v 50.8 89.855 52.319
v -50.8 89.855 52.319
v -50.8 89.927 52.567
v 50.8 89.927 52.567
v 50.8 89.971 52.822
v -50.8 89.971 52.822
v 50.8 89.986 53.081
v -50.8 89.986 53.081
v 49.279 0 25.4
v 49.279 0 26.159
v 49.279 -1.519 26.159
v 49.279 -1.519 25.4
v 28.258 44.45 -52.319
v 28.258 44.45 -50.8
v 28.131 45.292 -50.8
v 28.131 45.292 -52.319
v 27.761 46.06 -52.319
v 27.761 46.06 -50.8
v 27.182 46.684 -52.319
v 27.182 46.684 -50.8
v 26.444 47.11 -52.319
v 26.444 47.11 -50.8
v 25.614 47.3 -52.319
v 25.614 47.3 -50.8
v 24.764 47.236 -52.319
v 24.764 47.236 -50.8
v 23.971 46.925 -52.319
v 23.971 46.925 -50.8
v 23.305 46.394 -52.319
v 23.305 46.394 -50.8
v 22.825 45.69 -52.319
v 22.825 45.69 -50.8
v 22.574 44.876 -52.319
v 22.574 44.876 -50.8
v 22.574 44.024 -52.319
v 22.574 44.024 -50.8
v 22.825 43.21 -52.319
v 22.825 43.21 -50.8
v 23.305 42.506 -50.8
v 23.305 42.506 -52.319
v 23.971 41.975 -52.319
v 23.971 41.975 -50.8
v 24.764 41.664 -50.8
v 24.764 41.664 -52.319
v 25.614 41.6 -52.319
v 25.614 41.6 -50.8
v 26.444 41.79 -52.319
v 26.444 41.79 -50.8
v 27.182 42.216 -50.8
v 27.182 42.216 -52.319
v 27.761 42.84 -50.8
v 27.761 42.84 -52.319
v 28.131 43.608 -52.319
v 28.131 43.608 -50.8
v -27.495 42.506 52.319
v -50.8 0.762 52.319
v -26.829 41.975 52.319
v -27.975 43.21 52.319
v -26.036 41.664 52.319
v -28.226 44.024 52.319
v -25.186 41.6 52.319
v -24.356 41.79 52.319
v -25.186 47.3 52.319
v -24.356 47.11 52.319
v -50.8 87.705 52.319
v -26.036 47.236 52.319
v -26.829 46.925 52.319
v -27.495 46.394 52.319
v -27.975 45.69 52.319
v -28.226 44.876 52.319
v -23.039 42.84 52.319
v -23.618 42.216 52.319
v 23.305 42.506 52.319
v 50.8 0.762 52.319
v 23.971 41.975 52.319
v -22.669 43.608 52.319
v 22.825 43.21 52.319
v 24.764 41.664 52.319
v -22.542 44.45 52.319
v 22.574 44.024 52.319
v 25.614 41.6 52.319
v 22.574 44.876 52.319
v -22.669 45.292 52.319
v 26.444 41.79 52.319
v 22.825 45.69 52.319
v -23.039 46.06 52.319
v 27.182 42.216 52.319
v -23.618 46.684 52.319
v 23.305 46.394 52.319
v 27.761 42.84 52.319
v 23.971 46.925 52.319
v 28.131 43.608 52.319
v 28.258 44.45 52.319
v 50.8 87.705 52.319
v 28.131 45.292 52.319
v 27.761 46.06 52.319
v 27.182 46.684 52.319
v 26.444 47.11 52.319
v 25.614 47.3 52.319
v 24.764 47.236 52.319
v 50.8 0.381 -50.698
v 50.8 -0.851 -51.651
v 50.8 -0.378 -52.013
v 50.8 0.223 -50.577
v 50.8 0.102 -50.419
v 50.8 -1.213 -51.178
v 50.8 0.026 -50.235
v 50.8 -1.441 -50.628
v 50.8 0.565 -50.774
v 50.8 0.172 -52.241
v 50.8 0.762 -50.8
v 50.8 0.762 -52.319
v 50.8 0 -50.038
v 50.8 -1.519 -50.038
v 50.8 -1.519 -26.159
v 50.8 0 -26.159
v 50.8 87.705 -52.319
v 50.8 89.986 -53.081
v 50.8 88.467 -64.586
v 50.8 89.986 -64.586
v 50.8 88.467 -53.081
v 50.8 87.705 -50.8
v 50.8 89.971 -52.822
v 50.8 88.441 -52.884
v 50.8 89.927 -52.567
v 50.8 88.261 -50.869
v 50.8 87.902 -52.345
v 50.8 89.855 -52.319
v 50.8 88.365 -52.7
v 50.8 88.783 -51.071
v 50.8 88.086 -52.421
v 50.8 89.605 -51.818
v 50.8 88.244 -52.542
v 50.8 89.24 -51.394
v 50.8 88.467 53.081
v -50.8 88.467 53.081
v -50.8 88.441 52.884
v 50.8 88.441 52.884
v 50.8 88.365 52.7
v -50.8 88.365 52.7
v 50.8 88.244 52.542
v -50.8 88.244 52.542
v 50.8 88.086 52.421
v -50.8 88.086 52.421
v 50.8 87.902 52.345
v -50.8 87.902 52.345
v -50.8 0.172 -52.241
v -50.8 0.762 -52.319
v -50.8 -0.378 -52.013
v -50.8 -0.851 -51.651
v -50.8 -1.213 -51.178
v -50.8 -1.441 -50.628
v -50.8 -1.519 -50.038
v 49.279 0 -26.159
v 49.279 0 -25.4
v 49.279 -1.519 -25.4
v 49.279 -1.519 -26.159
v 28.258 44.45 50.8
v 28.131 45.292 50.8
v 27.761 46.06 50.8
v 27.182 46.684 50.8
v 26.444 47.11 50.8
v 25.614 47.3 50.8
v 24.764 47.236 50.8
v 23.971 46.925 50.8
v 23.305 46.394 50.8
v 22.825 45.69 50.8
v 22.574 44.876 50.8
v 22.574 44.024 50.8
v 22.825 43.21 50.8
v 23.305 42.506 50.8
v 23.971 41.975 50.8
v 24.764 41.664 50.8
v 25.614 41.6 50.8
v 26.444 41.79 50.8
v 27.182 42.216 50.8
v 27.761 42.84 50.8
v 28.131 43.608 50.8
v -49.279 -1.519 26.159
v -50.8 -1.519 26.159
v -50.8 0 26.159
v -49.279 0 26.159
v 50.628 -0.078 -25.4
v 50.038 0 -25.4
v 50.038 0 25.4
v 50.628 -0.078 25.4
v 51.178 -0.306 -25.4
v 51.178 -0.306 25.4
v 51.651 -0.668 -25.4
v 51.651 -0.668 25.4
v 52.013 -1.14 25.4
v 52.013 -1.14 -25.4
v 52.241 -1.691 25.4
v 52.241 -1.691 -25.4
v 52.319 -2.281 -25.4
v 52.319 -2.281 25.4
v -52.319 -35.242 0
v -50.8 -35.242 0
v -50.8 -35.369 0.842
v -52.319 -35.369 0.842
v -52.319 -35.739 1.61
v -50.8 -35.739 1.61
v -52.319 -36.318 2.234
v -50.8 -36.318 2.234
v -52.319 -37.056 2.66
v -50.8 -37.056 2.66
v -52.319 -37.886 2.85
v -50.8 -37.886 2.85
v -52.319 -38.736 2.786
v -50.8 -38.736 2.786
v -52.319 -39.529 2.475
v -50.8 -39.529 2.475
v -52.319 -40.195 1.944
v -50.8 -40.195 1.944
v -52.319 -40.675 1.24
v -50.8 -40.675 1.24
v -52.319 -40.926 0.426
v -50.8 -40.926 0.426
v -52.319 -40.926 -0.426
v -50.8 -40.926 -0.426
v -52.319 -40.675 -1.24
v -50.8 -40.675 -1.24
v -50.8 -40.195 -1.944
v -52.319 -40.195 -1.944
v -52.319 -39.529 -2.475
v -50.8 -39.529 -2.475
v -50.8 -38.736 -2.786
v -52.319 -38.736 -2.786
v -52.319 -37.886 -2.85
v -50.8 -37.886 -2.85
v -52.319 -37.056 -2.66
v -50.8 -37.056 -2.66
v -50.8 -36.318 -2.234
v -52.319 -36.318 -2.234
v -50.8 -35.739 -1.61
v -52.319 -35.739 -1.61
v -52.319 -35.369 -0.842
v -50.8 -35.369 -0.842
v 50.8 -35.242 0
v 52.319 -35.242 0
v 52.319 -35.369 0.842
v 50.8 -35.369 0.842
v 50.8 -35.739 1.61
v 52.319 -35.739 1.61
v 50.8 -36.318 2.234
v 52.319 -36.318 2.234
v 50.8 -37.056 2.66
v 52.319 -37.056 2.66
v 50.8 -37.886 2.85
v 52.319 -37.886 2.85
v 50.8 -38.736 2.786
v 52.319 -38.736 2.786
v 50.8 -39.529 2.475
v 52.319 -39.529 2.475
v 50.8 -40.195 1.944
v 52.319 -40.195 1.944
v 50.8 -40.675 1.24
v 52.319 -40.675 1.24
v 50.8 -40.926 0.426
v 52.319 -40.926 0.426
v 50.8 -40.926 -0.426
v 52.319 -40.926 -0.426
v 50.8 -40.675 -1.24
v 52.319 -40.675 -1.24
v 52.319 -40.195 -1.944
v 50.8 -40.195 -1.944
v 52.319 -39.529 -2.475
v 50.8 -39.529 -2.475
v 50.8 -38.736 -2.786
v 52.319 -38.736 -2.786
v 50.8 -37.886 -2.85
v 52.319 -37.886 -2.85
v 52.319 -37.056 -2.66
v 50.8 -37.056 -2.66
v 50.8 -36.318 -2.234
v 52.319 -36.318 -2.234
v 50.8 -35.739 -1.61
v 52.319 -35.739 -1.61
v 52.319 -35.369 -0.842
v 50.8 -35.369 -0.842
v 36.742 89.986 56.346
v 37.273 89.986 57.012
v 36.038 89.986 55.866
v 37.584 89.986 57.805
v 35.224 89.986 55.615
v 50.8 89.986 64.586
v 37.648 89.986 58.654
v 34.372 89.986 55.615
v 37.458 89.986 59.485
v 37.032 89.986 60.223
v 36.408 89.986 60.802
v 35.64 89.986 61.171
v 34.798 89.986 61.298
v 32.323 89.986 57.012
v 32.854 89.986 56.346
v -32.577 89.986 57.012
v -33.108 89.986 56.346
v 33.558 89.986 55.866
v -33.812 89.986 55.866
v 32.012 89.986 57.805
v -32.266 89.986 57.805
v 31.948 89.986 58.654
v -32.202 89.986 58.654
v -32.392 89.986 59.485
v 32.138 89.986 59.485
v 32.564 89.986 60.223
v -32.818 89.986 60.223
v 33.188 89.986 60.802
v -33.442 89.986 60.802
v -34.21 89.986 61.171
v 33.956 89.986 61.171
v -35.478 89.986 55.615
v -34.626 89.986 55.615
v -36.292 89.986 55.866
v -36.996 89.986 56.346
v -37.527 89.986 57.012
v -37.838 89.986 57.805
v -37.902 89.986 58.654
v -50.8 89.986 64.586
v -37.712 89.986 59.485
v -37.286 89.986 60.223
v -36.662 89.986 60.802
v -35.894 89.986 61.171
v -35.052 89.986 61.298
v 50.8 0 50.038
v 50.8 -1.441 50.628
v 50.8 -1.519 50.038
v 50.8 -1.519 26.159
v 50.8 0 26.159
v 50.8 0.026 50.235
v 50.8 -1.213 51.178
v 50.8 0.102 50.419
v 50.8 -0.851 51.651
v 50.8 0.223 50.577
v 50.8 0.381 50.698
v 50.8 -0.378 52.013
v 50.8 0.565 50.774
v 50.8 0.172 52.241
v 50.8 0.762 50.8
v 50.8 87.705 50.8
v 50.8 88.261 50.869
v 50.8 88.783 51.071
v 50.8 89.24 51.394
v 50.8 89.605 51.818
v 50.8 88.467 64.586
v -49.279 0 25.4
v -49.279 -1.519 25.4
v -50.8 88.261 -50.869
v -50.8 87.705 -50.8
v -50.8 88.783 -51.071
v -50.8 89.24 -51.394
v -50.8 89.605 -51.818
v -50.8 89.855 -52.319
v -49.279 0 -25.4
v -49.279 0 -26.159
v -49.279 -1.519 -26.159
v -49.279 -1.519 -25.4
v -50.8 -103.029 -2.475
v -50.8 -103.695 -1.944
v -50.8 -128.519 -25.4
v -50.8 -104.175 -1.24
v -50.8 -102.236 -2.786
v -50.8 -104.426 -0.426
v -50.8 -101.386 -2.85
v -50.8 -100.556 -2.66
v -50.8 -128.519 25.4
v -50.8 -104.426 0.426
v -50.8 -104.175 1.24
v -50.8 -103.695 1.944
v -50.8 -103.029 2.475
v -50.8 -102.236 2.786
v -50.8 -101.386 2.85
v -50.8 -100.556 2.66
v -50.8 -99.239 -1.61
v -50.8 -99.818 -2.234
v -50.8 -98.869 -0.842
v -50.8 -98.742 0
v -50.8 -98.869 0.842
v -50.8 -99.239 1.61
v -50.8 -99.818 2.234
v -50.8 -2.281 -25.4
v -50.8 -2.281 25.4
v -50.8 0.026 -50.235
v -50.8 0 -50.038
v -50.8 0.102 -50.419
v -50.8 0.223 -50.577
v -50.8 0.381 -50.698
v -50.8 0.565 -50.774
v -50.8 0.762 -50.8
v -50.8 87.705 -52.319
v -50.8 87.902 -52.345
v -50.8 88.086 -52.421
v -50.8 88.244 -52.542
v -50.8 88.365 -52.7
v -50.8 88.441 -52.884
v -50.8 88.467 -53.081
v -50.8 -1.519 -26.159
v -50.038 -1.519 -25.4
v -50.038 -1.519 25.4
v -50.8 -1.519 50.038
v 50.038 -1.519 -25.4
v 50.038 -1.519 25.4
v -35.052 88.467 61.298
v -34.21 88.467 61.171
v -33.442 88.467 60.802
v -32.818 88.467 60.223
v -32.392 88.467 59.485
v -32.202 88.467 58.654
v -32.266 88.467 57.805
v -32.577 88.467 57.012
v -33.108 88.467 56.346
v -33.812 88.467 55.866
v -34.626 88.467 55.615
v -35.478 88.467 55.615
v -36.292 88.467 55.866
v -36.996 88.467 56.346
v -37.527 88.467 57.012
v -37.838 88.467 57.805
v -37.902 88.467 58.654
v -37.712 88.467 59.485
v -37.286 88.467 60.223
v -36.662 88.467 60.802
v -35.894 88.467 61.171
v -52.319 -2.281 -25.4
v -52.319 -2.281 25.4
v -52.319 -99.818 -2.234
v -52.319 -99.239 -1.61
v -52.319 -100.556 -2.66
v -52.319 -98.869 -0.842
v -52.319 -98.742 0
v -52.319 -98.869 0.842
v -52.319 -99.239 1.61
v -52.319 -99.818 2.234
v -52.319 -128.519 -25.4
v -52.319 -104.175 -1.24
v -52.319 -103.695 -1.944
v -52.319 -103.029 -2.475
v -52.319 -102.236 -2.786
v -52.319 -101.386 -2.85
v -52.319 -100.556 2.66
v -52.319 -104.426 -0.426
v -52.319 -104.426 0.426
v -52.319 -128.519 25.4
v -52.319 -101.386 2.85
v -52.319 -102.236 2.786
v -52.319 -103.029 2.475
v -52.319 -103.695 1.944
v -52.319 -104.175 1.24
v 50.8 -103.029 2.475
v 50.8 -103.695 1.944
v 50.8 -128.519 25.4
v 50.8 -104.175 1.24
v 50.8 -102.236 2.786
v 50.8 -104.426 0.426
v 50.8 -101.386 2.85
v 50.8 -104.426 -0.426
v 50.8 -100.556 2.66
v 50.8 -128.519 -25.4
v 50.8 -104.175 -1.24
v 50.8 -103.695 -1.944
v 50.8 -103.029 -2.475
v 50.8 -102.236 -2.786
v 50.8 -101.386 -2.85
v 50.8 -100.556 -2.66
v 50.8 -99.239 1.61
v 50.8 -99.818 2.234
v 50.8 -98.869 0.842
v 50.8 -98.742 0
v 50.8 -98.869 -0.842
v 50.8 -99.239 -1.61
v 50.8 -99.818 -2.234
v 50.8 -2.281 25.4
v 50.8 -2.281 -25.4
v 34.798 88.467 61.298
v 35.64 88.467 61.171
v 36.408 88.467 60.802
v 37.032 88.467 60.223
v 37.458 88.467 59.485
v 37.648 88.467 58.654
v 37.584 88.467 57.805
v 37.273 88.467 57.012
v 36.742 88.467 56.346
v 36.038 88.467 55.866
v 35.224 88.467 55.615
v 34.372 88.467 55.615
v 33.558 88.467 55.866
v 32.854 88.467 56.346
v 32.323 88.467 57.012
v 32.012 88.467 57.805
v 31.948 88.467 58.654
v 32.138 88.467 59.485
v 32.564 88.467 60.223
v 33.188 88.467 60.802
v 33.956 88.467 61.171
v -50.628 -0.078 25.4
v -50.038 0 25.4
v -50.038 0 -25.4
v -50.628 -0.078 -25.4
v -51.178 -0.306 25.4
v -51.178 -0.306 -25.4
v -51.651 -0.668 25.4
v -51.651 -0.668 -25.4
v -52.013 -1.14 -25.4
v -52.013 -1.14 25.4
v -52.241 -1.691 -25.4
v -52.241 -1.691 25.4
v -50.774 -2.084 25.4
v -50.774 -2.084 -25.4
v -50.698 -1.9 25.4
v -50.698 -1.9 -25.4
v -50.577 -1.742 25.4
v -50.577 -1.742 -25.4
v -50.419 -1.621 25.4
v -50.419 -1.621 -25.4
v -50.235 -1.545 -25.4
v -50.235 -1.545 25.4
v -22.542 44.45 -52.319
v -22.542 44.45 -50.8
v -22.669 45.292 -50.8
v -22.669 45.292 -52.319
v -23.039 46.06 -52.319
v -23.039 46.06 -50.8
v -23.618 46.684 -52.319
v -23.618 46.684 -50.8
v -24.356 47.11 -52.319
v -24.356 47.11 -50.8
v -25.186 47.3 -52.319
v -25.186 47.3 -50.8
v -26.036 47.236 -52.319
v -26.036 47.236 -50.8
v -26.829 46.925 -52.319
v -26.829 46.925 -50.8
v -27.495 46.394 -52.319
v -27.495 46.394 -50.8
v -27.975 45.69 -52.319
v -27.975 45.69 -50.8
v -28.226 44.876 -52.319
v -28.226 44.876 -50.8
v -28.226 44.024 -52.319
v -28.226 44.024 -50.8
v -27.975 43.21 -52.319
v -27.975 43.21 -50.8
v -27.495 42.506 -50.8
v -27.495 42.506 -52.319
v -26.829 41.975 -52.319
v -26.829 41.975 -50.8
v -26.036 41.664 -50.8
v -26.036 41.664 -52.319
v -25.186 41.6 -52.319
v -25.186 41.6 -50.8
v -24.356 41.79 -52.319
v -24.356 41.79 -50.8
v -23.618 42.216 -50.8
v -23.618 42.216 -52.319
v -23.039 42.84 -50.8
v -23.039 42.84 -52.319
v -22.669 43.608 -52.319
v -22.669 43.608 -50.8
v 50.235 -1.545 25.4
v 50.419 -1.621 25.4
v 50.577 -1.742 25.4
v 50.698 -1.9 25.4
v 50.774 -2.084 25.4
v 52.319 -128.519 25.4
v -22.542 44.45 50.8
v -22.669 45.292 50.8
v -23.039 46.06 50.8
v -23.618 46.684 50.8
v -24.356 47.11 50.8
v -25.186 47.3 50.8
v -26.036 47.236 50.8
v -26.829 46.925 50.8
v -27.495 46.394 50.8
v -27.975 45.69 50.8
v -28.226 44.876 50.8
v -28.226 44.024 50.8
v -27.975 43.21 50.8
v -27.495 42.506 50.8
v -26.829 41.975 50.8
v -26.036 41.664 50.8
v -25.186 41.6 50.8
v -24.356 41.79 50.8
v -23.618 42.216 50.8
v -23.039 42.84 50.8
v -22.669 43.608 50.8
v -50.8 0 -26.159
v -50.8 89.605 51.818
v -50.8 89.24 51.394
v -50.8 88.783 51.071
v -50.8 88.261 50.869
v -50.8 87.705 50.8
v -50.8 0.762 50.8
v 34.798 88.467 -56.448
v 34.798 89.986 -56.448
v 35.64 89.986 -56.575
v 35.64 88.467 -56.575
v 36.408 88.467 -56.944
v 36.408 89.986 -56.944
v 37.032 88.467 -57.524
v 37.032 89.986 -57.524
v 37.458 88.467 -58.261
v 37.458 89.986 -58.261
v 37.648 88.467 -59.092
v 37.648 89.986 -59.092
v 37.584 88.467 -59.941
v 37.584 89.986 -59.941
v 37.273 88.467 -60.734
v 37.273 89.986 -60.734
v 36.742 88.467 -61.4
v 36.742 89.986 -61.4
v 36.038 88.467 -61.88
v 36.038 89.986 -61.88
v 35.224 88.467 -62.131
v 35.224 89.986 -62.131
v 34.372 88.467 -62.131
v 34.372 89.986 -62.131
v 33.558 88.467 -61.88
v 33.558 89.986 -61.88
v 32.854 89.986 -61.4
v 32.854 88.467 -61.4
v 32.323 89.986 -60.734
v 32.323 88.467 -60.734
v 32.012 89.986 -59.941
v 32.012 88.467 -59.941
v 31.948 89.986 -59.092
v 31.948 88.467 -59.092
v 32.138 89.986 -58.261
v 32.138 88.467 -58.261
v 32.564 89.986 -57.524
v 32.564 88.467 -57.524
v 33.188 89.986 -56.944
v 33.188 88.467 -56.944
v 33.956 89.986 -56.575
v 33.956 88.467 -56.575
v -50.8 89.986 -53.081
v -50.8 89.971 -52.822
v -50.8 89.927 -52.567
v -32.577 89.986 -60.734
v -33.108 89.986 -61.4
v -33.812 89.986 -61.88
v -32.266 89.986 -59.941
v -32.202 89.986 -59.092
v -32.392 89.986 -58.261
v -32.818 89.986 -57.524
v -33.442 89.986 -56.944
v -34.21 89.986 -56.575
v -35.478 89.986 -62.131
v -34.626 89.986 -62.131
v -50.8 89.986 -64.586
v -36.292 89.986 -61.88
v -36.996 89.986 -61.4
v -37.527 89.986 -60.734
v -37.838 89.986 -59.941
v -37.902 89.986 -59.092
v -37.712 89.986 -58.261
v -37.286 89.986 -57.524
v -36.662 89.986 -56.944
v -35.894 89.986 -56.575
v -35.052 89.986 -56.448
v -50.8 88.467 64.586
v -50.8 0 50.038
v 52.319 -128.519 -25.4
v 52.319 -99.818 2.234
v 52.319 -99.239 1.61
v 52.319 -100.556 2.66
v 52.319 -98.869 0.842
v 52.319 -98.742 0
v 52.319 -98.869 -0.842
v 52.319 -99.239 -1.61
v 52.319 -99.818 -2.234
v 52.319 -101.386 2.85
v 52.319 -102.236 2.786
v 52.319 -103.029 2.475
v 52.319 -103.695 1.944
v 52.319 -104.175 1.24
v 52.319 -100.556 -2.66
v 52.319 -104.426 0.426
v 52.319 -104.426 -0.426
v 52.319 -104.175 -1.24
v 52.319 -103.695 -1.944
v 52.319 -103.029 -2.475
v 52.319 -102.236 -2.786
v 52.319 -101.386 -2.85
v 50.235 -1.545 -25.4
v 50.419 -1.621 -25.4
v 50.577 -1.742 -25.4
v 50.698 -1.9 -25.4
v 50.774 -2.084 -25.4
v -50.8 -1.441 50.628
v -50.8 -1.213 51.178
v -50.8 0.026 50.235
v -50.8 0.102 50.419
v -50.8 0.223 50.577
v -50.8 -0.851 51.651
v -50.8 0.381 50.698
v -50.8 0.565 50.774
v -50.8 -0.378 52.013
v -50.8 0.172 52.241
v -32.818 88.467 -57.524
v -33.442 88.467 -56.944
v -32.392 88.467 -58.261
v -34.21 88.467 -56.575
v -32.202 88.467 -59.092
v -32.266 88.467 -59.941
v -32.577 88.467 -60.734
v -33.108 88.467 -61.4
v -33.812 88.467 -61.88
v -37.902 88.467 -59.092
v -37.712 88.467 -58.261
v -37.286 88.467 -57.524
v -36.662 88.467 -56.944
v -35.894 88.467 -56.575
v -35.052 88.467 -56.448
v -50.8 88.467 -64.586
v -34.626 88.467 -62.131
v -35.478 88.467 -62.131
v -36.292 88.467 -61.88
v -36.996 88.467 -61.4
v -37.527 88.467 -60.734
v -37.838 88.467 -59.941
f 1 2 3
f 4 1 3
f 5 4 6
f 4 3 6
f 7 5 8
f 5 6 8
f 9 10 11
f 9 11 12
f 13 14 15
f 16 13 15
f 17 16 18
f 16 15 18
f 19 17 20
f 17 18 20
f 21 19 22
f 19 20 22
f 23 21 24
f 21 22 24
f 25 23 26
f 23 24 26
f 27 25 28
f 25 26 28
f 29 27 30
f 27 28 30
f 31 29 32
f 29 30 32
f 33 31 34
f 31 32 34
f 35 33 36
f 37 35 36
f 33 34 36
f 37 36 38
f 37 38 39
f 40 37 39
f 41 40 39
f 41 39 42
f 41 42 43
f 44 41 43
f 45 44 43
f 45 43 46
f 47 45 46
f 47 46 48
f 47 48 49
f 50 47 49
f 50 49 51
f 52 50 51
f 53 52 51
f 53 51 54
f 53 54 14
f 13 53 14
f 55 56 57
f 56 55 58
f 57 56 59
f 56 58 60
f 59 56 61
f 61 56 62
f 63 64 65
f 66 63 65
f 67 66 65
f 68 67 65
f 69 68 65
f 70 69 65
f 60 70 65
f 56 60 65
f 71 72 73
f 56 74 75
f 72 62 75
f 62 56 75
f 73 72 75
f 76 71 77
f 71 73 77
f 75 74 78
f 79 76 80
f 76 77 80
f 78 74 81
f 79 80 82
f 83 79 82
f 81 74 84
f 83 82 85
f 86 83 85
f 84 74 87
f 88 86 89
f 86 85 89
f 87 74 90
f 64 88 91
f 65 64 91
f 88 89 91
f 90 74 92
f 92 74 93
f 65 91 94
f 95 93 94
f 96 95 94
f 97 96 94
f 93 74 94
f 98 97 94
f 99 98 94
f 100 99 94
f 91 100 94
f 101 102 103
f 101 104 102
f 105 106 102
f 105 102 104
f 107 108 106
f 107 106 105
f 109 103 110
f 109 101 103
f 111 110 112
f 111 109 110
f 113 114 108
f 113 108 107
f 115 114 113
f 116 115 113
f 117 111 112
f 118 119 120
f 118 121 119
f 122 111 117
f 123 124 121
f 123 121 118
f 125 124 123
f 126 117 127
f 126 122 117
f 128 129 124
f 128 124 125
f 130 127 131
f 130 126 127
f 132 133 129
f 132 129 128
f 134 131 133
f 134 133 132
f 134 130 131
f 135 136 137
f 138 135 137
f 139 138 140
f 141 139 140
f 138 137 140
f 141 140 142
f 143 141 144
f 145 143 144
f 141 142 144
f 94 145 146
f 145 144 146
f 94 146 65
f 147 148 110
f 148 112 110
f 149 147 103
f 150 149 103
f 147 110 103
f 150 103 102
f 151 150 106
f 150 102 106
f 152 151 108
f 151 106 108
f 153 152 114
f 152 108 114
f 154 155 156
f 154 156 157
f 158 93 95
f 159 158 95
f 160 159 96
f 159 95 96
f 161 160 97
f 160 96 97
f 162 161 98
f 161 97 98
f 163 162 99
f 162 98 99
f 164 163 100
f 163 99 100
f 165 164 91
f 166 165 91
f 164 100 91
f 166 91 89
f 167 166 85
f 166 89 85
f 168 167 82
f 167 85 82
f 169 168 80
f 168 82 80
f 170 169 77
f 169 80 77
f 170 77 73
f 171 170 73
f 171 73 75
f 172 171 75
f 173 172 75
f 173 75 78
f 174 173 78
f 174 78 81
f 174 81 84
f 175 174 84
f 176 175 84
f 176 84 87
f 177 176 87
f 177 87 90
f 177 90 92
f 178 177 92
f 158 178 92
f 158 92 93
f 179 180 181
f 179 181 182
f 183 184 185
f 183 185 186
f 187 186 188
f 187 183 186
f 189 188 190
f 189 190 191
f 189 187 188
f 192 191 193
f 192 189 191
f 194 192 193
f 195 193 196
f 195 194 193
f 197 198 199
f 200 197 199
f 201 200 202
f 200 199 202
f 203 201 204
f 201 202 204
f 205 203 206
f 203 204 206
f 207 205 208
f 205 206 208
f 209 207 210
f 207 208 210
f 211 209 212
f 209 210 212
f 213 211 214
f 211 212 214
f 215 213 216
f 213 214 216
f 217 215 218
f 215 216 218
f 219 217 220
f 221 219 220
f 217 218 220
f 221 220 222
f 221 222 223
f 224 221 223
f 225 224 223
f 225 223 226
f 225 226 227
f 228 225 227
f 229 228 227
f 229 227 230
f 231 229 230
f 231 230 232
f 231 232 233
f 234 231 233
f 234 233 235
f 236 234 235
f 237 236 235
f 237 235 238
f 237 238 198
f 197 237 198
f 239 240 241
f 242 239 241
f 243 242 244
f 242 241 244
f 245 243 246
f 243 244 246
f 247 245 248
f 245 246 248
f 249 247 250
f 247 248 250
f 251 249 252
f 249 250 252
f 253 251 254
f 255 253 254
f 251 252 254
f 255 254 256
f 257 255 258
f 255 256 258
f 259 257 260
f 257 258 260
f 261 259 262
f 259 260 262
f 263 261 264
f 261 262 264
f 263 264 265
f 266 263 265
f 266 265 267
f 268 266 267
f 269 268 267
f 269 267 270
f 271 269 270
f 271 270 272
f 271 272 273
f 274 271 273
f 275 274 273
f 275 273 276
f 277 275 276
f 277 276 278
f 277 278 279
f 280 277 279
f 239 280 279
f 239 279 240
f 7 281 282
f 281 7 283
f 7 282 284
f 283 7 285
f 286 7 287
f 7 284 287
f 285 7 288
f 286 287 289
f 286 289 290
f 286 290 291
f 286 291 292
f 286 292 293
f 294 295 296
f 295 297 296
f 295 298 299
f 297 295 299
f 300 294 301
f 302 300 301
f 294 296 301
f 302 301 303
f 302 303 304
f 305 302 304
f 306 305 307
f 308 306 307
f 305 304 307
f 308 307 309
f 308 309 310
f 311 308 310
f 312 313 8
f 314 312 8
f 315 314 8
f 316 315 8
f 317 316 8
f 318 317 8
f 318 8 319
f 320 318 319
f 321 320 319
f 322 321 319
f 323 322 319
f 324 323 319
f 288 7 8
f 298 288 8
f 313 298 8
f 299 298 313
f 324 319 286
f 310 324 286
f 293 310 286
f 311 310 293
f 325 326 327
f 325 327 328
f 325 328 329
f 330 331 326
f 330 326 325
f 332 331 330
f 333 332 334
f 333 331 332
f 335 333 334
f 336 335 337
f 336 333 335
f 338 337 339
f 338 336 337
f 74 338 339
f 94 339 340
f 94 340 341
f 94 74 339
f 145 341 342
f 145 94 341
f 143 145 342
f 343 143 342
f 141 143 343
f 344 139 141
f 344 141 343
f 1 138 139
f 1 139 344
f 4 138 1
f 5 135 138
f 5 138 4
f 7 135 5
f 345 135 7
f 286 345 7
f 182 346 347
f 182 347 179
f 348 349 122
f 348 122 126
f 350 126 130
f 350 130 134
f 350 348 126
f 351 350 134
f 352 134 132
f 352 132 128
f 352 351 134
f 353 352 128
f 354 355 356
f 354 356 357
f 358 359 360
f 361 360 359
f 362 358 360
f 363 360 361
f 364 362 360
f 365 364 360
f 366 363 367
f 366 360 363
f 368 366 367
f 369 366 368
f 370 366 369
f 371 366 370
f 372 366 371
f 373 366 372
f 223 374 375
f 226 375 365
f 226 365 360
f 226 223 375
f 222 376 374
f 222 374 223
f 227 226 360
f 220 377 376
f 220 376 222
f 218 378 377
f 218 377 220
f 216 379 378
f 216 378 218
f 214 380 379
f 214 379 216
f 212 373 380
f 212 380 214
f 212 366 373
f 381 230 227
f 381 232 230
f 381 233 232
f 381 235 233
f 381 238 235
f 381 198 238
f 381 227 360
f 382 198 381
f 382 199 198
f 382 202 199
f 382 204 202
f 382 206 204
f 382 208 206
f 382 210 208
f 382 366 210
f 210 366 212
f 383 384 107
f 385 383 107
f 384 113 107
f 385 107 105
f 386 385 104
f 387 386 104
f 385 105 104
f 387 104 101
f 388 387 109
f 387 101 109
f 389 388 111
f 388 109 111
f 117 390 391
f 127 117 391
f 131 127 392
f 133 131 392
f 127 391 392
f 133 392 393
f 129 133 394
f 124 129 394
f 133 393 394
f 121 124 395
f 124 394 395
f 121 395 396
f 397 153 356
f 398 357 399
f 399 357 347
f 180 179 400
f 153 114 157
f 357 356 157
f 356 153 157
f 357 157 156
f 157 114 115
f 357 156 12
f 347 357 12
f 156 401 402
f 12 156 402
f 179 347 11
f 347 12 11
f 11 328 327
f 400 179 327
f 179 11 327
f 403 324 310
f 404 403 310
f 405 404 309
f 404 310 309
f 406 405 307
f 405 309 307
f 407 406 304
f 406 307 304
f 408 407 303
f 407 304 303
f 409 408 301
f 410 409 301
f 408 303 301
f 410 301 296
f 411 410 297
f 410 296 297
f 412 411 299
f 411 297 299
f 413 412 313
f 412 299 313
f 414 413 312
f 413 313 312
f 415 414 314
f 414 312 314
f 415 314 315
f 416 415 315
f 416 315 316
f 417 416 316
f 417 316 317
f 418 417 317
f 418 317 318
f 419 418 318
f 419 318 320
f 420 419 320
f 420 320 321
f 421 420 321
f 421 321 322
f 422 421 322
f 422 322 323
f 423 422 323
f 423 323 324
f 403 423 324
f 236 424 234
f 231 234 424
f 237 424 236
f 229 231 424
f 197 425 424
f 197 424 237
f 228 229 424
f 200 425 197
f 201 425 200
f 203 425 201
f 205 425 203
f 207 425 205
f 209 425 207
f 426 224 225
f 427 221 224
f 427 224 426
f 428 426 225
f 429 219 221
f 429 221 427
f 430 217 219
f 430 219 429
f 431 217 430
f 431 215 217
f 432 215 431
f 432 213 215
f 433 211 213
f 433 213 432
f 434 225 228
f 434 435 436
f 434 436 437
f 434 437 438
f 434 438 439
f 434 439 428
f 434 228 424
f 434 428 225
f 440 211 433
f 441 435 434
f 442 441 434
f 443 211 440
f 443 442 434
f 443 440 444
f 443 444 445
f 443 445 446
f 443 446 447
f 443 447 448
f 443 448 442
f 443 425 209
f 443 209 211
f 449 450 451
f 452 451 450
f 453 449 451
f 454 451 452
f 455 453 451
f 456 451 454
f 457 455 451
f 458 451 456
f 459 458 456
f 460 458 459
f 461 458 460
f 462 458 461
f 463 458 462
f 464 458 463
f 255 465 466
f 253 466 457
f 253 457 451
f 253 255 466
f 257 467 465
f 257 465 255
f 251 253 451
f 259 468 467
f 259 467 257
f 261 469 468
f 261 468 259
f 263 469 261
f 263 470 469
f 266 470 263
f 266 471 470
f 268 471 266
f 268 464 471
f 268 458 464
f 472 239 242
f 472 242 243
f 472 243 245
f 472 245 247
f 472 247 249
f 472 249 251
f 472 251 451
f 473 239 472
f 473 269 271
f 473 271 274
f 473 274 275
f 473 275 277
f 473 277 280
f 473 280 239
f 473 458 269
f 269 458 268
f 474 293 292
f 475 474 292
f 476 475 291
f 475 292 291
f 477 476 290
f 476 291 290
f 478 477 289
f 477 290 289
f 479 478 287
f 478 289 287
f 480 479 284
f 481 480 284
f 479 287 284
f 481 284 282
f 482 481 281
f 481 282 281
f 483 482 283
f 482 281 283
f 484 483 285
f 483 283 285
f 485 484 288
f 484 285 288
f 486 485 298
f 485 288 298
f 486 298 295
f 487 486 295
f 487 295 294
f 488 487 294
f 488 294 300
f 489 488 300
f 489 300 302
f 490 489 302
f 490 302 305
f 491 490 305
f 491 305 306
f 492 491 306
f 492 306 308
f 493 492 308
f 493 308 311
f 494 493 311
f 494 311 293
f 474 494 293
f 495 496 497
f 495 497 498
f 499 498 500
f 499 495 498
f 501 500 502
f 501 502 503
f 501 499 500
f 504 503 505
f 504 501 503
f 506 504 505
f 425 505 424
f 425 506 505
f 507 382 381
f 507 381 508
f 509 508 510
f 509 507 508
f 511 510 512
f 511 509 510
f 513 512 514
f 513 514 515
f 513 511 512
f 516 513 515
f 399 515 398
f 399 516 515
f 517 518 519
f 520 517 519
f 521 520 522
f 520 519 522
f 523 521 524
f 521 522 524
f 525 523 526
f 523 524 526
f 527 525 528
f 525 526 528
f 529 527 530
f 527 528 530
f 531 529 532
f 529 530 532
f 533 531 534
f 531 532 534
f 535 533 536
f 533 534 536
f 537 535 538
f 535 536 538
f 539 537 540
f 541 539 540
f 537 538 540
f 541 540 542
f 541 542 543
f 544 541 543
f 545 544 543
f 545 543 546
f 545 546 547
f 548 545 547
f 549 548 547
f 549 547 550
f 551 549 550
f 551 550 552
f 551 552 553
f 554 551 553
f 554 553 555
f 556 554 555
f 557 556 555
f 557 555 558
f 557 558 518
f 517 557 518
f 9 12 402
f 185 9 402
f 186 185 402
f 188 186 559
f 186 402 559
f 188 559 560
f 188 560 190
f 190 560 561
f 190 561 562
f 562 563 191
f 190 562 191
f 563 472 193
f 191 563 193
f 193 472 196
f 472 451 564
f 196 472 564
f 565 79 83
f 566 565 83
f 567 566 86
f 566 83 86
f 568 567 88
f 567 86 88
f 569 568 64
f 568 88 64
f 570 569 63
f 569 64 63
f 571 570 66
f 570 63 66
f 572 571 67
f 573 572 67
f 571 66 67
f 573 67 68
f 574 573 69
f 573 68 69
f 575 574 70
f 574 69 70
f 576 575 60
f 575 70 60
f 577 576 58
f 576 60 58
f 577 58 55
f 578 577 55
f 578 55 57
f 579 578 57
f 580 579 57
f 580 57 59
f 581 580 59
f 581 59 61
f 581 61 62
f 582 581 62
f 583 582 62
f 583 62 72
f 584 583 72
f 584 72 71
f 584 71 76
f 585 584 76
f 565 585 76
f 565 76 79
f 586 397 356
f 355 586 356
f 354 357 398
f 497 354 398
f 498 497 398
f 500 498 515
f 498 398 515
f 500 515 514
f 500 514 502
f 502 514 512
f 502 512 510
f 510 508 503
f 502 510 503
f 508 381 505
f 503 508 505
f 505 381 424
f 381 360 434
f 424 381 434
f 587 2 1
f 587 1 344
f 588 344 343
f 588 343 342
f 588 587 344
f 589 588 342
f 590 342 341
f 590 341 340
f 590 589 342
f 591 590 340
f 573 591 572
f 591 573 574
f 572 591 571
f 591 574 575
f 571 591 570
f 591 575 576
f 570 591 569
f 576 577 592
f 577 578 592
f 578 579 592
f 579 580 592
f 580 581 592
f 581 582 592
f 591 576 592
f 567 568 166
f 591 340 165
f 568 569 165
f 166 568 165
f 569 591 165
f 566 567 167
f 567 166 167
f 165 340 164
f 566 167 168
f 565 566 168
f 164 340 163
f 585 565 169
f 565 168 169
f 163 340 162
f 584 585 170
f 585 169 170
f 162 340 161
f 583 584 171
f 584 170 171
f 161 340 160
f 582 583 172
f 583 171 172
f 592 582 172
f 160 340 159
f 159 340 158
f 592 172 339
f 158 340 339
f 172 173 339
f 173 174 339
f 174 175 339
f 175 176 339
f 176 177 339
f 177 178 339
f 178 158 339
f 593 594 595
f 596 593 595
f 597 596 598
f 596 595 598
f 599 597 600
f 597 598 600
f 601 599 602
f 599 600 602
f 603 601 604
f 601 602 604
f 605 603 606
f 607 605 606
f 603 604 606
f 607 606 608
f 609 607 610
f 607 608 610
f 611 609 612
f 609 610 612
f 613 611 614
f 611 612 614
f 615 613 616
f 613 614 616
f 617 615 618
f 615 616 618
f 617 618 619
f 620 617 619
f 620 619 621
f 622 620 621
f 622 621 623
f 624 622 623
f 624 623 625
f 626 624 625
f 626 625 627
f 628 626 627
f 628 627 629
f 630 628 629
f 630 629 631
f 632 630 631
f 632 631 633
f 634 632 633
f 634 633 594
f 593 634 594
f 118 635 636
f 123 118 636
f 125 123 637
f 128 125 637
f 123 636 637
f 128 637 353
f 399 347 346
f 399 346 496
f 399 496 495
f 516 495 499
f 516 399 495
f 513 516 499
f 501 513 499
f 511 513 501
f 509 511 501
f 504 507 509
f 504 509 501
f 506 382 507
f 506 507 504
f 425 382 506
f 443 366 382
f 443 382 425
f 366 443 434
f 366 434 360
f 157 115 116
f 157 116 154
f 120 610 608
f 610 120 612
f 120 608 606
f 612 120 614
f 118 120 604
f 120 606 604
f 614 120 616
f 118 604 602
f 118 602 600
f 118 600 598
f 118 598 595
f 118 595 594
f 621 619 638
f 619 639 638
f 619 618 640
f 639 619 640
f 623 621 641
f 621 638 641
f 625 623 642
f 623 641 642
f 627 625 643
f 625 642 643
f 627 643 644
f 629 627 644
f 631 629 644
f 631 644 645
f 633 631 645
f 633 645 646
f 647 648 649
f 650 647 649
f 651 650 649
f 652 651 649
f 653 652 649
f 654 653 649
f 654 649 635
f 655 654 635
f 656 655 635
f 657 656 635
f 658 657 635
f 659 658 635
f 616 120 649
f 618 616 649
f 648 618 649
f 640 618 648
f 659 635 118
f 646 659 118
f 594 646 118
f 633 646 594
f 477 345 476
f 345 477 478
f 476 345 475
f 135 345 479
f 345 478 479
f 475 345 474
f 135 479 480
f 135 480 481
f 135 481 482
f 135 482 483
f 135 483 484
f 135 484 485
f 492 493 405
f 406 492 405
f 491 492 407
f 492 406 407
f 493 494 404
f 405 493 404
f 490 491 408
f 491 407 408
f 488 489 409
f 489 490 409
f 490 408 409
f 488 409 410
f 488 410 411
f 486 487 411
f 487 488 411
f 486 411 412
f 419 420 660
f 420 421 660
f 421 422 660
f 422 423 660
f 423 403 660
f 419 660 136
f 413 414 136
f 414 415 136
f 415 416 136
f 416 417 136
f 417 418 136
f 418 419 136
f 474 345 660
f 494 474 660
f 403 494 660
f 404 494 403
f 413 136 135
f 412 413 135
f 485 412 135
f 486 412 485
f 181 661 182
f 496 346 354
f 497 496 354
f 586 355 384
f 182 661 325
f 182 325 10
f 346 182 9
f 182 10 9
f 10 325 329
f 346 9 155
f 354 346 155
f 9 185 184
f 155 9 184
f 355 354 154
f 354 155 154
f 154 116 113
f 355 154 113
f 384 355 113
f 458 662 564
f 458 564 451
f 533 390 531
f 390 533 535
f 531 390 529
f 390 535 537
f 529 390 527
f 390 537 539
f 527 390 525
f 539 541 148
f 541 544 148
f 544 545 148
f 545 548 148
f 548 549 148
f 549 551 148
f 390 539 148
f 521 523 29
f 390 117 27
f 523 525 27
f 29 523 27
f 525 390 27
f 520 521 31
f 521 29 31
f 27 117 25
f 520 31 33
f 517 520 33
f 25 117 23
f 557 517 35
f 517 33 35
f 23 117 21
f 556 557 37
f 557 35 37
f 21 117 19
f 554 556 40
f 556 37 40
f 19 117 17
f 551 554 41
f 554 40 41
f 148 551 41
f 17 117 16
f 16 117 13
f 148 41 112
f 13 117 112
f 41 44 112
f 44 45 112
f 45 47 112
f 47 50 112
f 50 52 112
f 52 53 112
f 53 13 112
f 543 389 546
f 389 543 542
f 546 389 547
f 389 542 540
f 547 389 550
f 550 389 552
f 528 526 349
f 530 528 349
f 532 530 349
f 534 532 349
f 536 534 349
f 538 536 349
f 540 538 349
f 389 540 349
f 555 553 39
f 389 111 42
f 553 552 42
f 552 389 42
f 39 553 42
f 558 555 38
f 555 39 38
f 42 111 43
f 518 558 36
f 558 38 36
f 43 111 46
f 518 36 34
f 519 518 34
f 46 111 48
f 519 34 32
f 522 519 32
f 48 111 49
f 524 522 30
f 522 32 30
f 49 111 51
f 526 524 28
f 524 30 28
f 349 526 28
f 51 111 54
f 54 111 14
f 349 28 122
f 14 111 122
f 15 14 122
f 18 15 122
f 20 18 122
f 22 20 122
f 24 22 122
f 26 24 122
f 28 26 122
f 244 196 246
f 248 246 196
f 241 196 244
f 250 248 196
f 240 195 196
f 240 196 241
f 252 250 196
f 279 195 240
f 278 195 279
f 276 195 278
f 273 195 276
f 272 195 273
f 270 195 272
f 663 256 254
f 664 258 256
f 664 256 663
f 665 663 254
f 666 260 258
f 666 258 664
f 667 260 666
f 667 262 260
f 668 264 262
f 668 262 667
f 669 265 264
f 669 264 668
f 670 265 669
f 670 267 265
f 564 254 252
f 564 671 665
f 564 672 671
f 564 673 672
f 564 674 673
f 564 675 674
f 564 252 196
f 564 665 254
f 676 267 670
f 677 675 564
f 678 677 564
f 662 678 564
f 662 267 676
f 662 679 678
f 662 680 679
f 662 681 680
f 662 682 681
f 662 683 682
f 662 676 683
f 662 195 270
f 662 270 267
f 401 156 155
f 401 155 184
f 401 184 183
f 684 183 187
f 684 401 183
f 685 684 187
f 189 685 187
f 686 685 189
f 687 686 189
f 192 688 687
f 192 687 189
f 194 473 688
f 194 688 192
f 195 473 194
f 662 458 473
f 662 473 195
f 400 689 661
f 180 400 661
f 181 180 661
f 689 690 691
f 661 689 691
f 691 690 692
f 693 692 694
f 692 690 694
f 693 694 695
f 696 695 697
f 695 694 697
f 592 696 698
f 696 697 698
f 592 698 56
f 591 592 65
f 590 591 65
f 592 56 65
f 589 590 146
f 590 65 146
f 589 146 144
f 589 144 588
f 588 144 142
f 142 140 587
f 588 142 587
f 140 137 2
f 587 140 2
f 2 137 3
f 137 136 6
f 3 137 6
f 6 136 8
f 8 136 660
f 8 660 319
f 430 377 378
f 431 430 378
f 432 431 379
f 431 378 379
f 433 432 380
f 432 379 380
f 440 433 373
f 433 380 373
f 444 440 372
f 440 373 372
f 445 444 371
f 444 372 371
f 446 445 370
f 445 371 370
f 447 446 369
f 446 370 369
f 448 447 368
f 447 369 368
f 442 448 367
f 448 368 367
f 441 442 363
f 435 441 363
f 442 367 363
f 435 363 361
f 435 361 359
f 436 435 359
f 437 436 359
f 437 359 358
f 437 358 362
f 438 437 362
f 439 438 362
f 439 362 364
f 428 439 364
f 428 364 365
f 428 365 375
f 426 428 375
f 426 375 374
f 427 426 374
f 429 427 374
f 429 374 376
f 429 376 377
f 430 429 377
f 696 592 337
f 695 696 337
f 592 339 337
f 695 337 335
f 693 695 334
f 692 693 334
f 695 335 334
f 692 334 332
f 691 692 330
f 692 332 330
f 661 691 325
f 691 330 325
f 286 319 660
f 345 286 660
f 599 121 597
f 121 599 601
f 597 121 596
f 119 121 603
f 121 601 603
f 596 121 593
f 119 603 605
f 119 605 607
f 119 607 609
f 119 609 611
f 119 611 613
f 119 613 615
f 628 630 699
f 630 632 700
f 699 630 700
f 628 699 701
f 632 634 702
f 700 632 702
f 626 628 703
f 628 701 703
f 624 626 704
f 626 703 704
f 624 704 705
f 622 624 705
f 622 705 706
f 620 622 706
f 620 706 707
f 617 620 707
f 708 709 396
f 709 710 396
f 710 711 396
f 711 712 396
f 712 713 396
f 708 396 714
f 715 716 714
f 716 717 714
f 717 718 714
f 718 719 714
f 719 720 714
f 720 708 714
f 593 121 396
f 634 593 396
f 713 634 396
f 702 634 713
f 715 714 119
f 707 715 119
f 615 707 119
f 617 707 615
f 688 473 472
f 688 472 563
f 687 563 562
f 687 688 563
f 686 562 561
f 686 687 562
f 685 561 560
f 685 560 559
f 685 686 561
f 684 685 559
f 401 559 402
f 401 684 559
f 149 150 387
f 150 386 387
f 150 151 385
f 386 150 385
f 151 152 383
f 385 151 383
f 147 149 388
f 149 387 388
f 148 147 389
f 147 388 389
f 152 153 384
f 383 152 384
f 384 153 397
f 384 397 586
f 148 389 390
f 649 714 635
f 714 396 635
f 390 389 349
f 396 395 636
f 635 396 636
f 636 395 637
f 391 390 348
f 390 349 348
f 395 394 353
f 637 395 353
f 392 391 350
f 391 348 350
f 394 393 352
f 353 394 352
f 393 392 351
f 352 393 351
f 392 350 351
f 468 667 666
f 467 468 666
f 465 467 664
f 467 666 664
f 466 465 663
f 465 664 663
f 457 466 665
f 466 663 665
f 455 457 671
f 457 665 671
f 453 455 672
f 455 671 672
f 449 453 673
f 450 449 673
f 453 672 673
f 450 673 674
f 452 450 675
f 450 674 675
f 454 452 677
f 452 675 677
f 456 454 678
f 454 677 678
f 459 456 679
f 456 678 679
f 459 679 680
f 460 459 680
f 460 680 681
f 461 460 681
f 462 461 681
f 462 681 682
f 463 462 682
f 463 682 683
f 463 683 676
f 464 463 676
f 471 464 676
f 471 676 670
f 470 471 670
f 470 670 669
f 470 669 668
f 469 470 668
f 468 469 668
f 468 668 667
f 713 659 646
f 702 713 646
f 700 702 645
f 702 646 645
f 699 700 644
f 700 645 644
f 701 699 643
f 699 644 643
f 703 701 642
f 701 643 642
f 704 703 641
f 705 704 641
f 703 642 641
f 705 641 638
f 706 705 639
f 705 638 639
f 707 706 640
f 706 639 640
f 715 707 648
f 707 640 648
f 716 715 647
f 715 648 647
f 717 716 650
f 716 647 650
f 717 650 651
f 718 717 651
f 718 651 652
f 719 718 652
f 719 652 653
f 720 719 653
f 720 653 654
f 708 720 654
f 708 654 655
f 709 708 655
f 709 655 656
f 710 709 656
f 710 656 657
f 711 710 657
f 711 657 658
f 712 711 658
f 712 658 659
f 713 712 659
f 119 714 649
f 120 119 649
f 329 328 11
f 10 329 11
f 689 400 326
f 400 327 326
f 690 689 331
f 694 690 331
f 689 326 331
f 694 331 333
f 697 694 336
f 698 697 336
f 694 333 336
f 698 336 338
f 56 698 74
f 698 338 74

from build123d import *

# Parameters (mm, degrees)
BASE_FLANGE1_DEPTH              = 50.8
EDGE_FLANGE1_STRIP_W            = 7.59968
EDGE_FLANGE1_STRIP_H            = 1.51892
EDGE_FLANGE1_STRIP_CUT_DEPTH    = 50.8
EDGE_FLANGE1_RELIEF_W           = 8.35914
EDGE_FLANGE1_RELIEF_H           = 0.75946
EDGE_FLANGE1_RELIEF_CUT_DEPTH   = 1.51892
EDGE_FLANGE1_STRIP_2_W          = 7.59968
EDGE_FLANGE1_STRIP_2_H          = 1.51892
EDGE_FLANGE1_STRIP_CUT_2_DEPTH  = 50.8
EDGE_FLANGE1_RELIEF_2_W         = 8.35914
EDGE_FLANGE1_RELIEF_2_H         = 0.75946
EDGE_FLANGE1_RELIEF_CUT_2_DEPTH = 1.51892
EDGE_FLANGE1_DEPTH              = 50.8
EDGE_FLANGE1_BEND_DEPTH         = 50.8
SKETCHED_START                  = -50.8
SKETCHED_BEND1_DEPTH            = 101.6
SKETCHED_BEND1_2_DEPTH          = 101.6
SKETCHED_BEND2_DEPTH            = 101.6
SKETCHED_BEND2_2_DEPTH          = 101.6
SKETCH15_R                      = 2.8575
CUT_EXTRUDE1_DEPTH              = 178.869439856
SKETCH17_R                      = 2.8575
CUT_EXTRUDE2_DEPTH              = 2.54
SKETCH18_R                      = 2.8575
CUT_EXTRUDE3_DEPTH              = 182.441822775


# Read off the part's stored shape, not the designer's step: Sketched Bend1, Sketched Bend2
# Sheet-metal steps are written as plain solids
with BuildPart() as part:
    # Sketch2 → Base-Flange1 (new, symmetric)
    with BuildSketch(Plane(origin=(0, 0, 0), x_dir=(0, 0, -1), z_dir=(1, 0, 0))):
        with BuildLine():
            Line((-50.8, 101.6), (-50.8, 0.762))
            ThreePointArc((-50.8, 0.762), (-50.576815367, 0.223184633), (-50.038, 0))
            Line((-50.038, 0), (50.038, 0))
            ThreePointArc((50.038, 0), (50.576815367, 0.223184633), (50.8, 0.762))
            Line((50.8, 0.762), (50.8, 101.6))
            Line((50.8, 101.6), (52.31892, 101.6))
            Line((52.31892, 101.6), (52.31892, 0.762))
            ThreePointArc((52.31892, 0.762), (51.650853999, -0.850853999), (50.038, -1.51892))
            Line((50.038, -1.51892), (-50.038, -1.51892))
            ThreePointArc((-50.038, -1.51892), (-51.650853999, -0.850853999), (-52.31892, 0.762))
            Line((-52.31892, 0.762), (-52.31892, 101.6))
            Line((-52.31892, 101.6), (-50.8, 101.6))
        make_face()
    extrude(amount=BASE_FLANGE1_DEPTH, both=True)

    # Edge-Flange1 strip (across the edge) → Edge-Flange1 strip cut (cut)
    with BuildSketch(Plane(origin=(50.8, -1.51892, -25.4), x_dir=(-1, 0, 0), z_dir=(0, 0, 1))):
        with Locations((-3.03784, -0.75946)):
            Rectangle(EDGE_FLANGE1_STRIP_W, EDGE_FLANGE1_STRIP_H)
    extrude(amount=EDGE_FLANGE1_STRIP_CUT_DEPTH, mode=Mode.SUBTRACT)

    # Edge-Flange1 relief (on the sheet) → Edge-Flange1 relief cut (cut)
    with BuildSketch(Plane(origin=(50.038, -1.51892, -25.4), x_dir=(-1, 0, 0), z_dir=(0, -1, 0))):
        with Locations((-3.42011, 0.37973)):
            Rectangle(EDGE_FLANGE1_RELIEF_W, EDGE_FLANGE1_RELIEF_H)
        with Locations((-3.42011, -51.17973)):
            Rectangle(EDGE_FLANGE1_RELIEF_W, EDGE_FLANGE1_RELIEF_H)
    extrude(amount=-EDGE_FLANGE1_RELIEF_CUT_DEPTH, mode=Mode.SUBTRACT)

    # Edge-Flange1 strip 2 (across the edge) → Edge-Flange1 strip cut 2 (cut)
    with BuildSketch(Plane(origin=(-50.8, -1.51892, 25.4), x_dir=(1, 0, 0), z_dir=(0, 0, -1))):
        with Locations((-3.03784, -0.75946)):
            Rectangle(EDGE_FLANGE1_STRIP_2_W, EDGE_FLANGE1_STRIP_2_H)
    extrude(amount=EDGE_FLANGE1_STRIP_CUT_2_DEPTH, mode=Mode.SUBTRACT)

    # Edge-Flange1 relief 2 (on the sheet) → Edge-Flange1 relief cut 2 (cut)
    with BuildSketch(Plane(origin=(-50.038, -1.51892, 25.4), x_dir=(1, 0, 0), z_dir=(0, -1, 0))):
        with Locations((-3.42011, 0.37973)):
            Rectangle(EDGE_FLANGE1_RELIEF_2_W, EDGE_FLANGE1_RELIEF_2_H)
        with Locations((-3.42011, -51.17973)):
            Rectangle(EDGE_FLANGE1_RELIEF_2_W, EDGE_FLANGE1_RELIEF_2_H)
    extrude(amount=-EDGE_FLANGE1_RELIEF_CUT_2_DEPTH, mode=Mode.SUBTRACT)

    # Edge-Flange1 section (across the edge) → Edge-Flange1 (add)
    with BuildSketch(Plane(origin=(50.8, -1.51892, -25.4), x_dir=(-1, 0, 0), z_dir=(0, 0, 1))):
        with BuildLine():
            Line((-1.51892, 0.762), (-1.51892, 127))
            Line((-1.51892, 127), (0, 127))
            Line((0, 127), (0, 0.762))
            ThreePointArc((0, 0.762), (0.223184633, 0.223184633), (0.762, 0))
            Line((0.762, 0), (0.762, -1.51892))
            ThreePointArc((0.762, -1.51892), (-0.850853999, -0.850853999), (-1.51892, 0.762))
        make_face()
    extrude(amount=EDGE_FLANGE1_DEPTH)

    # Edge-Flange1 section 2 (across the edge) → Edge-Flange1 bend (add)
    with BuildSketch(Plane(origin=(-50.8, -1.51892, 25.4), x_dir=(1, 0, 0), z_dir=(0, 0, -1))):
        with BuildLine():
            Line((-1.51892, 0.762), (-1.51892, 127))
            Line((-1.51892, 127), (0, 127))
            Line((0, 127), (0, 0.762))
            ThreePointArc((0, 0.762), (0.223184633, 0.223184633), (0.762, 0))
            Line((0.762, 0), (0.762, -1.51892))
            ThreePointArc((0.762, -1.51892), (-0.850853999, -0.850853999), (-1.51892, 0.762))
        make_face()
    extrude(amount=EDGE_FLANGE1_BEND_DEPTH)

    # Sketched Bend1 outline → Sketched Bend1 (cut)
    with BuildSketch(Plane.YZ.offset(SKETCHED_START)):
        with BuildLine():
            ThreePointArc((89.854920675, 52.31892), (89.021204447, 51.218038215), (87.70504811, 50.8))
            Line((87.70504811, 50.8), (101.6, 50.8))
            Line((101.6, 50.8), (101.6, 52.31892))
            Line((101.6, 52.31892), (89.854920675, 52.31892))
        make_face()
    extrude(amount=SKETCHED_BEND1_DEPTH, mode=Mode.SUBTRACT)

    # Sketched Bend1 2 outline → Sketched Bend1 2 (add)
    with BuildSketch(Plane.YZ.offset(SKETCHED_START)):
        with BuildLine():
            Line((87.70504811, 52.31892), (89.854920675, 52.31892))
            ThreePointArc((89.854920675, 52.31892), (89.952967523, 52.694326729), (89.98596811, 53.08092))
            Line((89.98596811, 53.08092), (89.98596811, 64.58596811))
            Line((89.98596811, 64.58596811), (88.46704811, 64.58596811))
            Line((88.46704811, 64.58596811), (88.46704811, 53.08092))
            ThreePointArc((88.46704811, 53.08092), (88.243863477, 52.542104633), (87.70504811, 52.31892))
        make_face()
    extrude(amount=SKETCHED_BEND1_2_DEPTH)

    # Sketched Bend2 outline → Sketched Bend2 (cut)
    with BuildSketch(Plane.YZ.offset(SKETCHED_START)):
        with BuildLine():
            ThreePointArc((87.70504811, -50.8), (89.021204447, -51.218038215), (89.854920675, -52.31892))
            Line((89.854920675, -52.31892), (101.6, -52.31892))
            Line((101.6, -52.31892), (101.6, -50.8))
            Line((101.6, -50.8), (87.70504811, -50.8))
        make_face()
    extrude(amount=SKETCHED_BEND2_DEPTH, mode=Mode.SUBTRACT)

    # Sketched Bend2 2 outline → Sketched Bend2 2 (add)
    with BuildSketch(Plane.YZ.offset(SKETCHED_START)):
        with BuildLine():
            Line((88.46704811, -64.58596811), (89.98596811, -64.58596811))
            Line((89.98596811, -64.58596811), (89.98596811, -53.08092))
            ThreePointArc((89.98596811, -53.08092), (89.952967523, -52.694326729), (89.854920675, -52.31892))
            Line((89.854920675, -52.31892), (87.70504811, -52.31892))
            ThreePointArc((87.70504811, -52.31892), (88.243863477, -52.542104633), (88.46704811, -53.08092))
            Line((88.46704811, -53.08092), (88.46704811, -64.58596811))
        make_face()
    extrude(amount=SKETCHED_BEND2_2_DEPTH)

    # Sketch15 → Cut-Extrude1 (cut, through all)
    with BuildSketch(Plane(origin=(52.31892, 0, 0), x_dir=(0, 0, -1), z_dir=(1, 0, 0))):
        with Locations(Location((0, -38.1, 0), (0, 0, 90))):
            Circle(SKETCH15_R)
        with Locations(Location((0, -101.6, 0), (0, 0, 90))):
            Circle(SKETCH15_R)
    extrude(amount=-CUT_EXTRUDE1_DEPTH, mode=Mode.SUBTRACT)

    # Sketch17 → Cut-Extrude2 (cut)
    with BuildSketch(Plane(origin=(0, 89.98596811, 0), x_dir=(1, 0, 0), z_dir=(0, 1, 0))):
        with Locations(Location((-35.052, 59.305404319, 0), (0, 0, 270))):
            Circle(SKETCH17_R)
        with Locations(Location((34.798, 59.305404319, 0), (0, 0, 270))):
            Circle(SKETCH17_R)
        with Locations(Location((-35.052, -58.440894052, 0), (0, 0, 270))):
            Circle(SKETCH17_R)
        with Locations(Location((34.798, -58.440894052, 0), (0, 0, 270))):
            Circle(SKETCH17_R)
    extrude(amount=-CUT_EXTRUDE2_DEPTH, mode=Mode.SUBTRACT)

    # Sketch18 → Cut-Extrude3 (cut, through all)
    with BuildSketch(Plane.XY.offset(52.31892)):
        with Locations((-25.4, 44.45)):
            Circle(SKETCH18_R)
        with Locations((25.4, 44.45)):
            Circle(SKETCH18_R)
    extrude(amount=-CUT_EXTRUDE3_DEPTH, mode=Mode.SUBTRACT)


solid = part.part
